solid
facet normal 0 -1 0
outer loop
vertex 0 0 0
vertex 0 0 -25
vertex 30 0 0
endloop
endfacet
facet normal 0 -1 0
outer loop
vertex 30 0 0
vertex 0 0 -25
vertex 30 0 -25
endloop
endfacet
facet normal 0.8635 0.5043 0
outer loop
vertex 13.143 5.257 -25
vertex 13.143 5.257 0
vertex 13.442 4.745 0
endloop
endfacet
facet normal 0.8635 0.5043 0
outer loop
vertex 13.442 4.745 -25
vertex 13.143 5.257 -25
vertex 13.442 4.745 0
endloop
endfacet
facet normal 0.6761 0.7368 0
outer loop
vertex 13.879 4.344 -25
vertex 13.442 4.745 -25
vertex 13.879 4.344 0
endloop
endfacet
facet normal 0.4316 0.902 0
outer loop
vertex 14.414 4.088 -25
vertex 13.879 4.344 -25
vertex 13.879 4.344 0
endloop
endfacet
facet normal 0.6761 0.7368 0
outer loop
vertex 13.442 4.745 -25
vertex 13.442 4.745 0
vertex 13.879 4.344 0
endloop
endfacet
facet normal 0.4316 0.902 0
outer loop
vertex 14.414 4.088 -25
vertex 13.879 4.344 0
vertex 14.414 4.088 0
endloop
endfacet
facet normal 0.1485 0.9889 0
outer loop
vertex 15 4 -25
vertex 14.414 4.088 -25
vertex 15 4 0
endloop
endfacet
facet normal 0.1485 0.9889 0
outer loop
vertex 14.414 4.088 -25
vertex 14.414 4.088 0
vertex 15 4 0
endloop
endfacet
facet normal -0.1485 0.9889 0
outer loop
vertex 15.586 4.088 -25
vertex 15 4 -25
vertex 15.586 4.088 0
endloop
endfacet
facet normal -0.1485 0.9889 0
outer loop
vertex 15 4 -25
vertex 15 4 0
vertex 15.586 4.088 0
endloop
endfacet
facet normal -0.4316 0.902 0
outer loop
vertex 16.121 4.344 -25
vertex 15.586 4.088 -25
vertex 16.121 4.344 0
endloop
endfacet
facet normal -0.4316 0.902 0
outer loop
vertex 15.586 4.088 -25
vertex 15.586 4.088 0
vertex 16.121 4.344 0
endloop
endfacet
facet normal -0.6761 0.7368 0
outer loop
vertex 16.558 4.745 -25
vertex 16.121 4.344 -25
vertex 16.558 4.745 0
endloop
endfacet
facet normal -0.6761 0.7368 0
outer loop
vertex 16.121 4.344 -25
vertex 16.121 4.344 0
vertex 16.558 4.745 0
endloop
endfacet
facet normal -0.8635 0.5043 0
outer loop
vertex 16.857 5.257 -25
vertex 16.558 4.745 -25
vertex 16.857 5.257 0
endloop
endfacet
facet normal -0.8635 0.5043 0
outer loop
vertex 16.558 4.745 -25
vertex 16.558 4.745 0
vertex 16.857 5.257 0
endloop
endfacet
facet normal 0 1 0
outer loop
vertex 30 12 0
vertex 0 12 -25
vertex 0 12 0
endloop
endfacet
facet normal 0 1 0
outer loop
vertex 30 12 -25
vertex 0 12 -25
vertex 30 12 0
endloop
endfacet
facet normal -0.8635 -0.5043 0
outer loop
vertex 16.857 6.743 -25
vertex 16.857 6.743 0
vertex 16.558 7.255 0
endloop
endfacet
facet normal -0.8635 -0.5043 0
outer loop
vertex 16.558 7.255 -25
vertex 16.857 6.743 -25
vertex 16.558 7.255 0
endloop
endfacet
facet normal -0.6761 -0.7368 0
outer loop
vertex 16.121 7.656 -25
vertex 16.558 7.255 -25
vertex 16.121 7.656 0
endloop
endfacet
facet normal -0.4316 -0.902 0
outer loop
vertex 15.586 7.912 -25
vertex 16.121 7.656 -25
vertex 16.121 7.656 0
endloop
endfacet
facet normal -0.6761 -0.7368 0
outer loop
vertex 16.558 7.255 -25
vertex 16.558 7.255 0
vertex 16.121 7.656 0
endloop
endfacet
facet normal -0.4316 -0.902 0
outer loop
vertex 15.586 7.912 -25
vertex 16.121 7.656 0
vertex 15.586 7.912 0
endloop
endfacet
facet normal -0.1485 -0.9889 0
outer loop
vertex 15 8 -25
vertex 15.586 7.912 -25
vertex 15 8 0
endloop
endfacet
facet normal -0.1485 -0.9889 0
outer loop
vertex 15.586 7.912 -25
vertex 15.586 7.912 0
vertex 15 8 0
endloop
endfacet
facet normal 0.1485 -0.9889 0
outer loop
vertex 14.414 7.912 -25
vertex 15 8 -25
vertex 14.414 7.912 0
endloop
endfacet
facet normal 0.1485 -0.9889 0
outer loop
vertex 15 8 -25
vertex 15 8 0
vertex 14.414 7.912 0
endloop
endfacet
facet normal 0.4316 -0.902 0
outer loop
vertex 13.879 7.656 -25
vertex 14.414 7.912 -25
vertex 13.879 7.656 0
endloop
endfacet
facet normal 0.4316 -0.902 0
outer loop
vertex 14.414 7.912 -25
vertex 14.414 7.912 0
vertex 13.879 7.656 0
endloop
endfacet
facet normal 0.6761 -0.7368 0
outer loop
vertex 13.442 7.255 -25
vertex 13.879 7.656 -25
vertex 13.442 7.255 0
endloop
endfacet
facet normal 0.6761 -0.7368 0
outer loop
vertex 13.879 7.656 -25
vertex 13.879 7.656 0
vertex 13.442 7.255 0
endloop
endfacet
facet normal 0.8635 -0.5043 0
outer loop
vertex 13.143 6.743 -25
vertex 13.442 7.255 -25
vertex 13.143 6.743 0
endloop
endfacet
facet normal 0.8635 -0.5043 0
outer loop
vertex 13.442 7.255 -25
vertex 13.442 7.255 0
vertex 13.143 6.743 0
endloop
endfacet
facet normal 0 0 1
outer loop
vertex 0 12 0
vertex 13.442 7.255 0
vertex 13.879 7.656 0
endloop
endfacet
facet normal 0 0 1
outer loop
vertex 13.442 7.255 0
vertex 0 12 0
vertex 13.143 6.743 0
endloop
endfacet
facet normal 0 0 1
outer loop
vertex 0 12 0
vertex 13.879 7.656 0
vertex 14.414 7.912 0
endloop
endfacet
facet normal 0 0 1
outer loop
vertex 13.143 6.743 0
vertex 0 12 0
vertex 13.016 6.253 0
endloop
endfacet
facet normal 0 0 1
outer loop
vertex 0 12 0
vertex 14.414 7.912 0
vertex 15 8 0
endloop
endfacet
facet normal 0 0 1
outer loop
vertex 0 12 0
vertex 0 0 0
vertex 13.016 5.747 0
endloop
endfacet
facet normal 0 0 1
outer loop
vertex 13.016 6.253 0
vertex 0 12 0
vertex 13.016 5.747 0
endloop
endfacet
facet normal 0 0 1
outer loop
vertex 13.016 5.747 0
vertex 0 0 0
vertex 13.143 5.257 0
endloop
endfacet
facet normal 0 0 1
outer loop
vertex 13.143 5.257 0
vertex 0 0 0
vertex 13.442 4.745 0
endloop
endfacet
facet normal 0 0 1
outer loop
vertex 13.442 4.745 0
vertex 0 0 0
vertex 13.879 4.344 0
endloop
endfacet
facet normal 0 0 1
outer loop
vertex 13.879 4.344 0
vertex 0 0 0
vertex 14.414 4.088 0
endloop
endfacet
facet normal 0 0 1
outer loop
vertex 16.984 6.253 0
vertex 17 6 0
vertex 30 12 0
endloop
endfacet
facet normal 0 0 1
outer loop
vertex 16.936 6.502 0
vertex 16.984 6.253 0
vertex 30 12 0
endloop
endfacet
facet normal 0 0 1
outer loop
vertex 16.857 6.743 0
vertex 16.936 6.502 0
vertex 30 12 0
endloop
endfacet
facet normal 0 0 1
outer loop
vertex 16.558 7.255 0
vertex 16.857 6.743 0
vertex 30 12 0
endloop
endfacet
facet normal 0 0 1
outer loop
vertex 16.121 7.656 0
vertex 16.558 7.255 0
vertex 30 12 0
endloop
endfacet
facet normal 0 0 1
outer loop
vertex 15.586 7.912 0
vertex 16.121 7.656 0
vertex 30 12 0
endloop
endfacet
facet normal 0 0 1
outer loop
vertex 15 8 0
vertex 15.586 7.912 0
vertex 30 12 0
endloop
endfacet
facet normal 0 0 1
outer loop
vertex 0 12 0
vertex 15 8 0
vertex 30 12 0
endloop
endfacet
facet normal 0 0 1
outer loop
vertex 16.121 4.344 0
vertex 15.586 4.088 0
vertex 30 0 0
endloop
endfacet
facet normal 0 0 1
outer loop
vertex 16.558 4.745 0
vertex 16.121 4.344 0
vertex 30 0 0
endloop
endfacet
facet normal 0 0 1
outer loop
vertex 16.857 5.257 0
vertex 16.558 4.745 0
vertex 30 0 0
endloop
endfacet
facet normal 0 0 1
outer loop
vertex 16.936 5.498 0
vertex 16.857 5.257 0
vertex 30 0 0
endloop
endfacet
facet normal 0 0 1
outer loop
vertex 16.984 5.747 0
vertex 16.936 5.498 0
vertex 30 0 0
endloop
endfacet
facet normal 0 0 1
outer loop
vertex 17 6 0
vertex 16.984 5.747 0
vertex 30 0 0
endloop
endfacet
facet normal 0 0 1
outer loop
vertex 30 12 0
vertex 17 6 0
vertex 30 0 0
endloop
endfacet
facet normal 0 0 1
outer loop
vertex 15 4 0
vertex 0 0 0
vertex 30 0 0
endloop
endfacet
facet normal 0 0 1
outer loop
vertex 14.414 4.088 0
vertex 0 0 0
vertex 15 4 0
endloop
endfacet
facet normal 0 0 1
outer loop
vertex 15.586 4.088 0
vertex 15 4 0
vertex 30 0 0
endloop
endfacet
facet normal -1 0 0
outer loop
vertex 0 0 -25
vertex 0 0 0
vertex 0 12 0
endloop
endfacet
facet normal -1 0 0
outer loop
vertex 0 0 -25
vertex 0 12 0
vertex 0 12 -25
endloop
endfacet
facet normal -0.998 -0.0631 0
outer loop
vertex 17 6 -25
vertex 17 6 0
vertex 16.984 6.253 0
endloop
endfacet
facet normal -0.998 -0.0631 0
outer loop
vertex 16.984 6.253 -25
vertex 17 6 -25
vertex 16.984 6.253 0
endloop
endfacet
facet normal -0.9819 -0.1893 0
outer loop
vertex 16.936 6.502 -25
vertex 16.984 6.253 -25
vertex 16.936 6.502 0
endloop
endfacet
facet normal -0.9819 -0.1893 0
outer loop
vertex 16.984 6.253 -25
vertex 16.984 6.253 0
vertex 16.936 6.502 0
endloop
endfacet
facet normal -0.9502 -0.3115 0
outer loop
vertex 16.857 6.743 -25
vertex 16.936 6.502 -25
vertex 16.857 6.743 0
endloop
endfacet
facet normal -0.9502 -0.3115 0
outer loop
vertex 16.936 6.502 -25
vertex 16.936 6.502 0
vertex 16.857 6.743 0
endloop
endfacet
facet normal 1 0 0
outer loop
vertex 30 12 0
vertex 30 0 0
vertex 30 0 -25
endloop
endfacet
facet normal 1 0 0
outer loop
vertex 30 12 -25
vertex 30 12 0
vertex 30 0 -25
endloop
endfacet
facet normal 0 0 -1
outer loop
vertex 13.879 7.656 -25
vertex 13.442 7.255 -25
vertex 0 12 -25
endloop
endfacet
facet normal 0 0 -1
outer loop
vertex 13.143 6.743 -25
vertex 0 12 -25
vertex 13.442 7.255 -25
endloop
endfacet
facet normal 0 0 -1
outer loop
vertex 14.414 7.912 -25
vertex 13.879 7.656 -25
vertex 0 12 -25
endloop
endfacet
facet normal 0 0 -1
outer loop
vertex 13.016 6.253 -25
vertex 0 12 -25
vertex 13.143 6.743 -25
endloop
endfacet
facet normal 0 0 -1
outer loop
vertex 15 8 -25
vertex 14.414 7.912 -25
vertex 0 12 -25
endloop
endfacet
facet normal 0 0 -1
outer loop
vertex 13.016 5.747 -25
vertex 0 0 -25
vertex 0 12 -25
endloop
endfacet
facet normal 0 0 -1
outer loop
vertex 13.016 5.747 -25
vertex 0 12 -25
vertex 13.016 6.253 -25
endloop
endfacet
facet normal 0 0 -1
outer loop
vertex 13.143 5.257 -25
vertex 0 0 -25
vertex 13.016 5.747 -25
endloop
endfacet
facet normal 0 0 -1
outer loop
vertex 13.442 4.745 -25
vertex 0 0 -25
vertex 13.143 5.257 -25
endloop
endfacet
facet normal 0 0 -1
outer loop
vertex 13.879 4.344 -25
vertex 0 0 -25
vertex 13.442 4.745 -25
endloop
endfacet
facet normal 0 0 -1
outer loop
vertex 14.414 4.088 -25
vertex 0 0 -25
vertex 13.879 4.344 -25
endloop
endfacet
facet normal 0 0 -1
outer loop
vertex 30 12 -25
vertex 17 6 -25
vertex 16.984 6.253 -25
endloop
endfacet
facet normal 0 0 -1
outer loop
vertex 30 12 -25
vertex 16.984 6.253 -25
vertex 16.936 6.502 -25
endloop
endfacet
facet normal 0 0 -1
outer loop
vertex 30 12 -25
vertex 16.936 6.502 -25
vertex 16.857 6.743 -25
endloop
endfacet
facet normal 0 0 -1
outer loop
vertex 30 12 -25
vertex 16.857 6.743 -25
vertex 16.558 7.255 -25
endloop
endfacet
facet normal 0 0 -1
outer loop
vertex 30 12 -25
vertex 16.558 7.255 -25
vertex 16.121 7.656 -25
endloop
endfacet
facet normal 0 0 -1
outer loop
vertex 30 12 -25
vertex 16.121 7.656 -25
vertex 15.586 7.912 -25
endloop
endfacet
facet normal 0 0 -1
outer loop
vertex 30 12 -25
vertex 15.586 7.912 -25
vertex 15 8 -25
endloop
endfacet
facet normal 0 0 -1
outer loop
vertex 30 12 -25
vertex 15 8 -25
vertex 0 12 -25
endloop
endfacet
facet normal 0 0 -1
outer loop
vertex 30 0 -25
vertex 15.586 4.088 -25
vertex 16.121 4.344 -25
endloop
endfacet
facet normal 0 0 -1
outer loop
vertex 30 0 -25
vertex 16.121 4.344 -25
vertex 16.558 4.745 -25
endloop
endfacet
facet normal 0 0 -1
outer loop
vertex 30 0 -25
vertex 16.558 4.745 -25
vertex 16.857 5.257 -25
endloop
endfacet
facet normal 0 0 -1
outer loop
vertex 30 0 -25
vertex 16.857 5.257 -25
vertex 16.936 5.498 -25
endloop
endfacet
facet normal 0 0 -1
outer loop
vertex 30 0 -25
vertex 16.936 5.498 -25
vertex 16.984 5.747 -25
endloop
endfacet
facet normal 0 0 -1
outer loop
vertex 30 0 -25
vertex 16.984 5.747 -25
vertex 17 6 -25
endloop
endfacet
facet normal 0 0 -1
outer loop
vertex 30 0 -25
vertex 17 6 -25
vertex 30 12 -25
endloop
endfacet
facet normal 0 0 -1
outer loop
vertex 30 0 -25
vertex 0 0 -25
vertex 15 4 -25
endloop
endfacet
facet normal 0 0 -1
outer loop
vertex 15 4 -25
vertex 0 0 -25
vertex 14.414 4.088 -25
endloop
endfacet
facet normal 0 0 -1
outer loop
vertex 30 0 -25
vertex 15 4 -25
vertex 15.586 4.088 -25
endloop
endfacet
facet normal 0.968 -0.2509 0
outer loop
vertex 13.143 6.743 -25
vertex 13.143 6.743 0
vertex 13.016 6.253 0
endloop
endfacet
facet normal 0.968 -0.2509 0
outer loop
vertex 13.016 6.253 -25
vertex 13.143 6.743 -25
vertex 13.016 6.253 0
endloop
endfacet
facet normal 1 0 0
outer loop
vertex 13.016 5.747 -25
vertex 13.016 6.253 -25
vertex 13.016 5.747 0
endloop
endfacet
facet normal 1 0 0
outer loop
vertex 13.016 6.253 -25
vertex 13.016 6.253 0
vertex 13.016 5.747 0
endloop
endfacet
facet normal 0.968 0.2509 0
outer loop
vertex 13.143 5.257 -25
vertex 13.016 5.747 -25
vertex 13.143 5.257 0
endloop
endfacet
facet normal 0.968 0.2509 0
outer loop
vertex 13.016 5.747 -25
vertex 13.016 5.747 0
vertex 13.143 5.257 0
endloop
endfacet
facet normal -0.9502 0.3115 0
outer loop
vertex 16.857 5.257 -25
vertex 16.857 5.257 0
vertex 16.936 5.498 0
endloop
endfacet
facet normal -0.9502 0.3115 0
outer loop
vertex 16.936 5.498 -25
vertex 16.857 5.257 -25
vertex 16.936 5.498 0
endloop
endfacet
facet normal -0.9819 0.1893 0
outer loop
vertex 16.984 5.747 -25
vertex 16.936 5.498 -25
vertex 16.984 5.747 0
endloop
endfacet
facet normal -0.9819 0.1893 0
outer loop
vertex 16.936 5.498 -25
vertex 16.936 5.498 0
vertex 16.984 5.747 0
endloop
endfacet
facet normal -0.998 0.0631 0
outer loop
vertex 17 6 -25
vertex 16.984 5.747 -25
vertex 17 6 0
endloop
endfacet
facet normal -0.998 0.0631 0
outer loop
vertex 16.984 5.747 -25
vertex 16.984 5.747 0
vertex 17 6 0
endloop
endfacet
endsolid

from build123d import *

# Parameters (mm, degrees)
SKETCH_1_W          = 30
SKETCH_1_H          = 25
EXTRUDE_1_DEPTH     = 12
CUT_EXTRUDE_1_DEPTH = 25


with BuildPart() as part:
    # 草图1 → 凸台-拉伸1 (new body)
    with BuildSketch(Plane(origin=(0, 0, 0), x_dir=(1, 0, 0), z_dir=(0, 1, 0))):
        with Locations((15, 12.5)):
            Rectangle(SKETCH_1_W, SKETCH_1_H)
    extrude(amount=EXTRUDE_1_DEPTH)

    # 草图2 → 切除-拉伸1 (cut)
    with BuildSketch(Plane.XY):
        with BuildLine():
            ThreePointArc((16.856953382, 6.742781353), (15, 8), (13.143046618, 6.742781353))
            Line((13.143046618, 6.742781353), (15, 6))
            Line((15, 6), (16.856953382, 6.742781353))
        make_face()
        with BuildLine():
            Line((15, 6), (13.143046618, 6.742781353))
            ThreePointArc((13.143046618, 6.742781353), (13, 6), (13.143046618, 5.257218647))
            Line((13.143046618, 5.257218647), (15, 6))
        make_face()
        with BuildLine():
            Line((16.856953382, 6.742781353), (15, 6))
            Line((15, 6), (16.856953382, 5.257218647))
            ThreePointArc((16.856953382, 5.257218647), (16.963912773, 5.621784958), (17, 6))
            ThreePointArc((17, 6), (16.963912773, 6.378215042), (16.856953382, 6.742781353))
        make_face()
        with BuildLine():
            Line((16.856953382, 5.257218647), (15, 6))
            Line((15, 6), (13.143046618, 5.257218647))
            ThreePointArc((13.143046618, 5.257218647), (15, 4), (16.856953382, 5.257218647))
        make_face()
    extrude(amount=-CUT_EXTRUDE_1_DEPTH, mode=Mode.SUBTRACT)


solid = part.part
